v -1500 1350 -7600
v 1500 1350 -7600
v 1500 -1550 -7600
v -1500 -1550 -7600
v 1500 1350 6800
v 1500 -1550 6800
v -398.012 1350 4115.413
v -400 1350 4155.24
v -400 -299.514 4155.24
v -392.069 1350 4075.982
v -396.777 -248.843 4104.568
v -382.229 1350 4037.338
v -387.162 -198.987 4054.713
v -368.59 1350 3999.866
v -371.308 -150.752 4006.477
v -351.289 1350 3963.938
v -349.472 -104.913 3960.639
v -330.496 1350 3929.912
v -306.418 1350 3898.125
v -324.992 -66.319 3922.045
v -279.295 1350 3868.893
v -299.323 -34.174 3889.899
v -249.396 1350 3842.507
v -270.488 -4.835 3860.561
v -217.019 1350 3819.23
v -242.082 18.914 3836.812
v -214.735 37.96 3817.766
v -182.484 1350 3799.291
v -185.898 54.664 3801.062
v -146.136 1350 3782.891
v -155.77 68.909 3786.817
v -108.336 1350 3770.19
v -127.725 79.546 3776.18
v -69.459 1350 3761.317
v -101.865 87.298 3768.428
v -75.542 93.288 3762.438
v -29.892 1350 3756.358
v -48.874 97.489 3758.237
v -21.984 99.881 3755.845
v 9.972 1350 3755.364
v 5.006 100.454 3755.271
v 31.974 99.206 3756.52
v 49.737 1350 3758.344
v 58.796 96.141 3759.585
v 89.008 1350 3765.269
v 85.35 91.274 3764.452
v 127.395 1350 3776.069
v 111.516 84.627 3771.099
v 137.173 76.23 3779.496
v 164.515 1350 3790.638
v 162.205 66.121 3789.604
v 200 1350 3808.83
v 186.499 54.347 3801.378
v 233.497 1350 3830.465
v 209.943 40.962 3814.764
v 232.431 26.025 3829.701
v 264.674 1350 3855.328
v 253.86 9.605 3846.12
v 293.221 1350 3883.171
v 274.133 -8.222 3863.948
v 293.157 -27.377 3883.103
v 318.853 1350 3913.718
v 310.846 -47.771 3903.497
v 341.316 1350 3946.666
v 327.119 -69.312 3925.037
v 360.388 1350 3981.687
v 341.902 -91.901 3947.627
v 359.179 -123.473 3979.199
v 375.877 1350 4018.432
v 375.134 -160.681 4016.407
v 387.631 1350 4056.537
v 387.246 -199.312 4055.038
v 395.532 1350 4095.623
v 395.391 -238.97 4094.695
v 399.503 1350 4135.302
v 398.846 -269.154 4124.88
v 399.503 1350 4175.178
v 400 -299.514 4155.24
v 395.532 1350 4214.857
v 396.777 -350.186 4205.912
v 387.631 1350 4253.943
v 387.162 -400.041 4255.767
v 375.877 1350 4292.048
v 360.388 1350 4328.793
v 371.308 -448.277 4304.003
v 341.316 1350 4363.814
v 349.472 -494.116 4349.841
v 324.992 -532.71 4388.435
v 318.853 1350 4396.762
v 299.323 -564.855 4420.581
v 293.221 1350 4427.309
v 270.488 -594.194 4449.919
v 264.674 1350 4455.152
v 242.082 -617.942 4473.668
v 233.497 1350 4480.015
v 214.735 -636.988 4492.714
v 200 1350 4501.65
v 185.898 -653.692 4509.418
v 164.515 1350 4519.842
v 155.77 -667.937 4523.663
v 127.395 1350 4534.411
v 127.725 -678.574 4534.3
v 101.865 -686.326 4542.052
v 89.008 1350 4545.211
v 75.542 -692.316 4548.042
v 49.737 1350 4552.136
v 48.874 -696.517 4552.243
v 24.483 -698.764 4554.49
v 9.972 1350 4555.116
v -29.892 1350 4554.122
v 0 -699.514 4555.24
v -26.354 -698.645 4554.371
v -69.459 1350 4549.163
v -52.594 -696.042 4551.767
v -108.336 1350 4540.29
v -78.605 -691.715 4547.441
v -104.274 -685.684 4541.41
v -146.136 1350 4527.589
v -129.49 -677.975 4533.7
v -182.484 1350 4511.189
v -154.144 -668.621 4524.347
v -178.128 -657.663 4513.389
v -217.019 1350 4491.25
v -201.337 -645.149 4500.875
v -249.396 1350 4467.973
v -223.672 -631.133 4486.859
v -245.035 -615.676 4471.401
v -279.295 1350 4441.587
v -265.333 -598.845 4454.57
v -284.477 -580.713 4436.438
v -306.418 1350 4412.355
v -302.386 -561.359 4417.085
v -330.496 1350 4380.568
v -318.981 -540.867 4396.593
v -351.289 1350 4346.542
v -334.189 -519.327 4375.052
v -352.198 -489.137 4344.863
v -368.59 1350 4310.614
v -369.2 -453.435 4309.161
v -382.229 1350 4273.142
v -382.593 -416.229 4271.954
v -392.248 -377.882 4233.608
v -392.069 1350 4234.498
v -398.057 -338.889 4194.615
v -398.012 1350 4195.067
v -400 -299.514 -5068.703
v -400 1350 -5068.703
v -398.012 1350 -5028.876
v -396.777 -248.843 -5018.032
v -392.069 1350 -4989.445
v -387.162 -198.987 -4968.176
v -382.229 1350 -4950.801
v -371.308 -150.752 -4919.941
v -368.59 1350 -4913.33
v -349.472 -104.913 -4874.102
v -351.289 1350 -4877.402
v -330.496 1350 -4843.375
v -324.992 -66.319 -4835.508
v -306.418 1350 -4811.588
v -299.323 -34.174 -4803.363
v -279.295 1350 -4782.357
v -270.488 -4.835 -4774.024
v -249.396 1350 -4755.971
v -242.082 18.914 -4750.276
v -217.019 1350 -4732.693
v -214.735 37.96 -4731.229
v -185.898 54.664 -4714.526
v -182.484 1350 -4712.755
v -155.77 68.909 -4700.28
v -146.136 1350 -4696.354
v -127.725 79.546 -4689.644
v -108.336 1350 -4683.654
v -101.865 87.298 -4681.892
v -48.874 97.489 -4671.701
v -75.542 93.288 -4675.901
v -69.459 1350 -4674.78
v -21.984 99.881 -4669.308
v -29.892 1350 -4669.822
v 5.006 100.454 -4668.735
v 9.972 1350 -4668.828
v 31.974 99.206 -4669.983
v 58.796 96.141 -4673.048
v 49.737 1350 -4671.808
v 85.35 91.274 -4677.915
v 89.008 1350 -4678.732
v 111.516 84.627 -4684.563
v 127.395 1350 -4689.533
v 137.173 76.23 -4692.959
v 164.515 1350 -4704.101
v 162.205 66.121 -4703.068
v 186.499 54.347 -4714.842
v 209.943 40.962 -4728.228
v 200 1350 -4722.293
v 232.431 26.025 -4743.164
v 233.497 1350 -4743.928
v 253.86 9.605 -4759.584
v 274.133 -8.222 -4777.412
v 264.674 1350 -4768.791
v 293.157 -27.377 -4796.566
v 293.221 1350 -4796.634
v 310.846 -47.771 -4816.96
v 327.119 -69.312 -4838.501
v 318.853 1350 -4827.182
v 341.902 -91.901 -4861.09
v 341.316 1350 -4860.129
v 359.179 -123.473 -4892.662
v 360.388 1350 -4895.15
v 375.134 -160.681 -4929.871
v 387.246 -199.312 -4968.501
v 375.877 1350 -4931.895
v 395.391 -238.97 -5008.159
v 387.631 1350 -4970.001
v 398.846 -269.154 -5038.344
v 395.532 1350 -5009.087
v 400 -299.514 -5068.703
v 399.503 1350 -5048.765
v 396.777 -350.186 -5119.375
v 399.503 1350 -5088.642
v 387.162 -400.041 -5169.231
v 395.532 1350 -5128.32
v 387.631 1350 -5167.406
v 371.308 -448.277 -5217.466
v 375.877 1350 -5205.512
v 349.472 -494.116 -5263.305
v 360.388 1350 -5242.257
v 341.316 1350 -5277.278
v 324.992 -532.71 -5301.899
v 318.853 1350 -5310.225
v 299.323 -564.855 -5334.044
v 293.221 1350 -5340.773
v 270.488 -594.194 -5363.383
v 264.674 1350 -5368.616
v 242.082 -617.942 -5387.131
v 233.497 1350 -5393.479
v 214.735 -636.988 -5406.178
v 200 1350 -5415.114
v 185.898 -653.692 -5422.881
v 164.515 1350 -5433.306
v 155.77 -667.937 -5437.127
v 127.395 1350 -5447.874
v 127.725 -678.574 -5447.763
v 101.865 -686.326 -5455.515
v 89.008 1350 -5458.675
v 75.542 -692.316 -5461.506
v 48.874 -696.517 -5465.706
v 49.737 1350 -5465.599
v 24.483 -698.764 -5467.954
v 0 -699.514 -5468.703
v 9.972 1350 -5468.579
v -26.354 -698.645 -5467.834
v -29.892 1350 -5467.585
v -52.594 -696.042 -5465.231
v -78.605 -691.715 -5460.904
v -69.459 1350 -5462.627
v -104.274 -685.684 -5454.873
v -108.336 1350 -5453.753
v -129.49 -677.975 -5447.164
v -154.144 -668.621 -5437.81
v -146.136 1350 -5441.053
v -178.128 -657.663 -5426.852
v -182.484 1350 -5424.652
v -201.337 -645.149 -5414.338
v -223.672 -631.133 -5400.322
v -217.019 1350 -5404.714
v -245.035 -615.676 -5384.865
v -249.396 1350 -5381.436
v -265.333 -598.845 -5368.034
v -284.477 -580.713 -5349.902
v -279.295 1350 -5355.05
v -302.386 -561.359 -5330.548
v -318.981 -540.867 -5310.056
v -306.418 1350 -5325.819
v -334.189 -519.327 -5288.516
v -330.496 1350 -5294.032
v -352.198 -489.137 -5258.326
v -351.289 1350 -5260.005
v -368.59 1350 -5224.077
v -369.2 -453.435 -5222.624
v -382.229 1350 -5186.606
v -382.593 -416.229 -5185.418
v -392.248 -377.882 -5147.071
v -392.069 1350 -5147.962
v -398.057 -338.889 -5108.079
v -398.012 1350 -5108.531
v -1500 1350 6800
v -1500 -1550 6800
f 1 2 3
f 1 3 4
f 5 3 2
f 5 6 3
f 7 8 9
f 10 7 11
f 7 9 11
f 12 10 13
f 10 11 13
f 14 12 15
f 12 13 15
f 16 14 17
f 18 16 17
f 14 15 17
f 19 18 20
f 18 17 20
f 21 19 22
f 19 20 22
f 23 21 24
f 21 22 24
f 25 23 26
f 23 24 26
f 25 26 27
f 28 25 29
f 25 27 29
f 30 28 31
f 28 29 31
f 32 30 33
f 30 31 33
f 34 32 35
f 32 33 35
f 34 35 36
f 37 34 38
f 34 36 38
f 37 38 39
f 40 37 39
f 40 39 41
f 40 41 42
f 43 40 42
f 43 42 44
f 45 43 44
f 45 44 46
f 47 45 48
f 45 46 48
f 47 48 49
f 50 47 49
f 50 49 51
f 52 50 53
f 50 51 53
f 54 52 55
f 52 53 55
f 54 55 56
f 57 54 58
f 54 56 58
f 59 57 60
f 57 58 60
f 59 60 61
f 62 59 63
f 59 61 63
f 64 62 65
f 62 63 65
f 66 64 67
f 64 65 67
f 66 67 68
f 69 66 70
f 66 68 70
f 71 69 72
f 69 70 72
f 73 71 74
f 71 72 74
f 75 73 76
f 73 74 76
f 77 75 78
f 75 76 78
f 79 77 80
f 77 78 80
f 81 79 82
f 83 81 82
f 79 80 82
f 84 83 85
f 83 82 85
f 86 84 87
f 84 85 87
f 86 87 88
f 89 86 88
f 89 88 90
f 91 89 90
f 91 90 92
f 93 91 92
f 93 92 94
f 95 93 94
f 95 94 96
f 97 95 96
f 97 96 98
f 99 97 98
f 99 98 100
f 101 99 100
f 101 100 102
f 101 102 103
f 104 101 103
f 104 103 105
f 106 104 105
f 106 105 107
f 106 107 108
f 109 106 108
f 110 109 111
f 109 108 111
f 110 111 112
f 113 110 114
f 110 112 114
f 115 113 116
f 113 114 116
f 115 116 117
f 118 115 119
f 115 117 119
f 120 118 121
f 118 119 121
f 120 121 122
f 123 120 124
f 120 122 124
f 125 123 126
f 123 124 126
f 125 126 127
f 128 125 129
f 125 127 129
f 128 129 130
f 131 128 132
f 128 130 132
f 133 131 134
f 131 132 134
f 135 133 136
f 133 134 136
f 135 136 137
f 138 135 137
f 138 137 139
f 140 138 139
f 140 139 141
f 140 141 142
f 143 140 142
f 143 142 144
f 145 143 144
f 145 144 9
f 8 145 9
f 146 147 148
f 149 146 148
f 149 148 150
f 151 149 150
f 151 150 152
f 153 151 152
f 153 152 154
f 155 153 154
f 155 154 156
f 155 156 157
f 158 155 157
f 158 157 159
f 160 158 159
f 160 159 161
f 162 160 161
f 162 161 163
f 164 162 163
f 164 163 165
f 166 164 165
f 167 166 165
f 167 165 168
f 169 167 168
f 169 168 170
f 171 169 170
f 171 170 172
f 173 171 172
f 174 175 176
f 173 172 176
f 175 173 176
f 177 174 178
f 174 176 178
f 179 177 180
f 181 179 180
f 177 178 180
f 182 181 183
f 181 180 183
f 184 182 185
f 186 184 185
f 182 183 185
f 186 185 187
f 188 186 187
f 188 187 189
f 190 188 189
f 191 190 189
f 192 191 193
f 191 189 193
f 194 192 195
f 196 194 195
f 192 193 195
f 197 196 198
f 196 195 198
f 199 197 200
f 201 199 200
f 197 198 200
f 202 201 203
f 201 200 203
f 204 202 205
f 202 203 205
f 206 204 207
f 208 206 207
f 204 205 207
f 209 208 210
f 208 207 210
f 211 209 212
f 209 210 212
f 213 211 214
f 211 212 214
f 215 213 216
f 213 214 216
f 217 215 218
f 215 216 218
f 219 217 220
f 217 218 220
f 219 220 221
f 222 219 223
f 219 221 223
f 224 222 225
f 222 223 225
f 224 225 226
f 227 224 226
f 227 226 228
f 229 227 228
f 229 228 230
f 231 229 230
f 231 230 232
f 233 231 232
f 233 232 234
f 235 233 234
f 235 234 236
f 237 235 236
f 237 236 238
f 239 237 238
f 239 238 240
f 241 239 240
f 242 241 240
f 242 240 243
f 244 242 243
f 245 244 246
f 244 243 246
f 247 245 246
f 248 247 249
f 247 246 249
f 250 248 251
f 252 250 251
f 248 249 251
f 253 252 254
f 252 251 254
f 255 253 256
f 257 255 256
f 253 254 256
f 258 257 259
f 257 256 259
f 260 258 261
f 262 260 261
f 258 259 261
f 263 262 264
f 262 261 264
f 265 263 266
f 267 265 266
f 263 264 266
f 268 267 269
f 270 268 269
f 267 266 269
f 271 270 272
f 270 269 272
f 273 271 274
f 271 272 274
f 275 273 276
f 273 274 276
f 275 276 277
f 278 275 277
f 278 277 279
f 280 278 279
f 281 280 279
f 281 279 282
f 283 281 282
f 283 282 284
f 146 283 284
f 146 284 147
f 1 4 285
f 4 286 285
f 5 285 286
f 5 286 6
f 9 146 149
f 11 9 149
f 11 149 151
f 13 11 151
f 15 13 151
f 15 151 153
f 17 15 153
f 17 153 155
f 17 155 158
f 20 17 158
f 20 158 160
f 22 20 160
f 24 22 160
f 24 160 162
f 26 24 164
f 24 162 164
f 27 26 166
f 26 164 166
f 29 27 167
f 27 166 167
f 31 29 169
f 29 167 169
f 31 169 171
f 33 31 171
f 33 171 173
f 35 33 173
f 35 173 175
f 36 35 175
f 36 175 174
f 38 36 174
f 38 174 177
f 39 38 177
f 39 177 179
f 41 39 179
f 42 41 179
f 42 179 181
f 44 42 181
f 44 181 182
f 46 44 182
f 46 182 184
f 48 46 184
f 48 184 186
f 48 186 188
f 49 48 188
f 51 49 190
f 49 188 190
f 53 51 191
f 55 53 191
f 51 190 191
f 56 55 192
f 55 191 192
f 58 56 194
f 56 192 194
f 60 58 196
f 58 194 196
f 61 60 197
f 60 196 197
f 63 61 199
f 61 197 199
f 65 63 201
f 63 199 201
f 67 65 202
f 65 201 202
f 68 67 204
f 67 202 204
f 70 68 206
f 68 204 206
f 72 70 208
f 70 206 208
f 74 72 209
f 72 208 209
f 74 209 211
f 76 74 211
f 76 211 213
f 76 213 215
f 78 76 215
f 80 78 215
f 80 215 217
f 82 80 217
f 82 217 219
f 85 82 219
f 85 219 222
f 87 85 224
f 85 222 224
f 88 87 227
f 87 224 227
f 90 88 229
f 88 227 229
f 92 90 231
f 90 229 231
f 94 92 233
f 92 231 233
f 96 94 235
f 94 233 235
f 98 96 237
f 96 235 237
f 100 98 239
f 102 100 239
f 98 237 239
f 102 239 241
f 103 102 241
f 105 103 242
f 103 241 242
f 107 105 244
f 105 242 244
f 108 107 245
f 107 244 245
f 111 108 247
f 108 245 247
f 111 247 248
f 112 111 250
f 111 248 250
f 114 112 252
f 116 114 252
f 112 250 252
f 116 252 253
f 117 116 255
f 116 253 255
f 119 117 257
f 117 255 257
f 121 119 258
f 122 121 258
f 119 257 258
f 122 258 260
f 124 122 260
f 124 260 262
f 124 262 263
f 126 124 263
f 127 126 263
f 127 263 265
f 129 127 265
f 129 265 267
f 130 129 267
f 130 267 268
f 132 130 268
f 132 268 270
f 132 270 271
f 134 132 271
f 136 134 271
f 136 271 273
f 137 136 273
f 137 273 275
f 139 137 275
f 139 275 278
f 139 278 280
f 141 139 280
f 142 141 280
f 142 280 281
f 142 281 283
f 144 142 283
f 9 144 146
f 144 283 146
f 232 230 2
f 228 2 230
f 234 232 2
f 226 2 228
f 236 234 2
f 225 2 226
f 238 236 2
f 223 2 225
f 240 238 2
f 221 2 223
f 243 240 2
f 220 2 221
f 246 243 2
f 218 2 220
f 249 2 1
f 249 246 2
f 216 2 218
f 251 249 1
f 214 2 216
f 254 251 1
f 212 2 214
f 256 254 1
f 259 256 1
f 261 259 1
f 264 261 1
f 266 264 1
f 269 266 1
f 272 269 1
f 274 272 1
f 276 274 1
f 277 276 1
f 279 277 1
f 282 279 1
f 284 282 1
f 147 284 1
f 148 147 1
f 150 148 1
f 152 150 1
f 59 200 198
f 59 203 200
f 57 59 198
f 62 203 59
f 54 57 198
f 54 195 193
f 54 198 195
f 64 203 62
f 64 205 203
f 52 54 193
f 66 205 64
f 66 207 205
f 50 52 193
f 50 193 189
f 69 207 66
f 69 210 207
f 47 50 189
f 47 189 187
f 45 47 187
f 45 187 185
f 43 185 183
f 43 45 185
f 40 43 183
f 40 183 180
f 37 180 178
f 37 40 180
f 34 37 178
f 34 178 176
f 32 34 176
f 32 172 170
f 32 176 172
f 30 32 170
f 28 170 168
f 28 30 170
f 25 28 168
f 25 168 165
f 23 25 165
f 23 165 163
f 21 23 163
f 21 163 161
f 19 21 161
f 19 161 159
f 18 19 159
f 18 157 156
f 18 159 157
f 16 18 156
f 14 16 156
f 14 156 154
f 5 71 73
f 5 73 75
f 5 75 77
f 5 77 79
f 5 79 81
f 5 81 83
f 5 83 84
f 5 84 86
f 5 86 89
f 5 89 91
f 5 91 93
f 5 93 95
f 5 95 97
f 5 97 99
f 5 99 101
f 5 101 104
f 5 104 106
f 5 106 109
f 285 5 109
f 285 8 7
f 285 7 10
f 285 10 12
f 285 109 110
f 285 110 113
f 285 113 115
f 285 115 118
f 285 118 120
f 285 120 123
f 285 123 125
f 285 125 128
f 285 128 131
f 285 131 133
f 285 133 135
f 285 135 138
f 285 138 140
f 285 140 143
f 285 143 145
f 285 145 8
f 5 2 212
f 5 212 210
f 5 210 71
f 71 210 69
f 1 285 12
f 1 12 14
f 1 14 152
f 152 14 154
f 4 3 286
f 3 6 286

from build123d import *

# Parameters (mm, degrees)
SKETCH2_W           = 13200
SKETCH2_H           = 2700
BOSS_EXTRUDE1_DEPTH = 1500
SKETCH4_R           = 400
SKETCH5_W           = 3000
SKETCH5_H           = 13200
BOSS_EXTRUDE2_DEPTH = 200
SKETCH6_W           = 3000
SKETCH6_H           = 2900
BOSS_EXTRUDE3_DEPTH = 200
SKETCH7_W           = 3000
SKETCH7_H           = 2900
BOSS_EXTRUDE4_DEPTH = 1000


with BuildPart() as part:
    # Sketch2 → Boss-Extrude1 (new body, symmetric)
    with BuildSketch(Plane(origin=(0, 0, 0), x_dir=(0, 0, -1), z_dir=(1, 0, 0))):
        Rectangle(SKETCH2_W, SKETCH2_H)
    extrude(amount=BOSS_EXTRUDE1_DEPTH, both=True)

    # Cut-Sweep1: sweep along a path in Sketch3
    with BuildLine(Plane(origin=(0, 0, 0), x_dir=(0, 0, -1), z_dir=(1, 0, 0))) as cut_sweep1_path:
        Line((-4155.24, 1658.848413631), (-4155.24, -299.514296906))
        Line((-4155.24, -299.514296906), (5068.703486095, -299.514296906))
        Line((5068.703486095, -299.514296906), (5068.703486095, 1658.848413631))
    # Sketch4 → Cut-Sweep1 (sweep, cut)
    with BuildSketch(Plane(origin=(0, 1658.848413631, 4155.24), x_dir=(-1, 0, 0), z_dir=(0, -1, 0))):
        Circle(SKETCH4_R)
    sweep(path=cut_sweep1_path.line, transition=Transition.RIGHT, mode=Mode.SUBTRACT)

    # Sketch5 → Boss-Extrude2 (add)
    with BuildSketch(Plane.XZ.offset(1350)):
        Rectangle(SKETCH5_W, SKETCH5_H)
    extrude(amount=BOSS_EXTRUDE2_DEPTH)

    # Sketch6 → Boss-Extrude3 (add)
    with BuildSketch(Plane.XY.offset(6600)):
        with Locations((0, -100)):
            Rectangle(SKETCH6_W, SKETCH6_H)
    extrude(amount=BOSS_EXTRUDE3_DEPTH)

    # Sketch7 → Boss-Extrude4 (add)
    with BuildSketch(Plane(origin=(0, 0, -6600), x_dir=(-1, 0, 0), z_dir=(0, 0, -1))):
        with Locations((0, -100)):
            Rectangle(SKETCH7_W, SKETCH7_H)
    extrude(amount=BOSS_EXTRUDE4_DEPTH)


solid = part.part
